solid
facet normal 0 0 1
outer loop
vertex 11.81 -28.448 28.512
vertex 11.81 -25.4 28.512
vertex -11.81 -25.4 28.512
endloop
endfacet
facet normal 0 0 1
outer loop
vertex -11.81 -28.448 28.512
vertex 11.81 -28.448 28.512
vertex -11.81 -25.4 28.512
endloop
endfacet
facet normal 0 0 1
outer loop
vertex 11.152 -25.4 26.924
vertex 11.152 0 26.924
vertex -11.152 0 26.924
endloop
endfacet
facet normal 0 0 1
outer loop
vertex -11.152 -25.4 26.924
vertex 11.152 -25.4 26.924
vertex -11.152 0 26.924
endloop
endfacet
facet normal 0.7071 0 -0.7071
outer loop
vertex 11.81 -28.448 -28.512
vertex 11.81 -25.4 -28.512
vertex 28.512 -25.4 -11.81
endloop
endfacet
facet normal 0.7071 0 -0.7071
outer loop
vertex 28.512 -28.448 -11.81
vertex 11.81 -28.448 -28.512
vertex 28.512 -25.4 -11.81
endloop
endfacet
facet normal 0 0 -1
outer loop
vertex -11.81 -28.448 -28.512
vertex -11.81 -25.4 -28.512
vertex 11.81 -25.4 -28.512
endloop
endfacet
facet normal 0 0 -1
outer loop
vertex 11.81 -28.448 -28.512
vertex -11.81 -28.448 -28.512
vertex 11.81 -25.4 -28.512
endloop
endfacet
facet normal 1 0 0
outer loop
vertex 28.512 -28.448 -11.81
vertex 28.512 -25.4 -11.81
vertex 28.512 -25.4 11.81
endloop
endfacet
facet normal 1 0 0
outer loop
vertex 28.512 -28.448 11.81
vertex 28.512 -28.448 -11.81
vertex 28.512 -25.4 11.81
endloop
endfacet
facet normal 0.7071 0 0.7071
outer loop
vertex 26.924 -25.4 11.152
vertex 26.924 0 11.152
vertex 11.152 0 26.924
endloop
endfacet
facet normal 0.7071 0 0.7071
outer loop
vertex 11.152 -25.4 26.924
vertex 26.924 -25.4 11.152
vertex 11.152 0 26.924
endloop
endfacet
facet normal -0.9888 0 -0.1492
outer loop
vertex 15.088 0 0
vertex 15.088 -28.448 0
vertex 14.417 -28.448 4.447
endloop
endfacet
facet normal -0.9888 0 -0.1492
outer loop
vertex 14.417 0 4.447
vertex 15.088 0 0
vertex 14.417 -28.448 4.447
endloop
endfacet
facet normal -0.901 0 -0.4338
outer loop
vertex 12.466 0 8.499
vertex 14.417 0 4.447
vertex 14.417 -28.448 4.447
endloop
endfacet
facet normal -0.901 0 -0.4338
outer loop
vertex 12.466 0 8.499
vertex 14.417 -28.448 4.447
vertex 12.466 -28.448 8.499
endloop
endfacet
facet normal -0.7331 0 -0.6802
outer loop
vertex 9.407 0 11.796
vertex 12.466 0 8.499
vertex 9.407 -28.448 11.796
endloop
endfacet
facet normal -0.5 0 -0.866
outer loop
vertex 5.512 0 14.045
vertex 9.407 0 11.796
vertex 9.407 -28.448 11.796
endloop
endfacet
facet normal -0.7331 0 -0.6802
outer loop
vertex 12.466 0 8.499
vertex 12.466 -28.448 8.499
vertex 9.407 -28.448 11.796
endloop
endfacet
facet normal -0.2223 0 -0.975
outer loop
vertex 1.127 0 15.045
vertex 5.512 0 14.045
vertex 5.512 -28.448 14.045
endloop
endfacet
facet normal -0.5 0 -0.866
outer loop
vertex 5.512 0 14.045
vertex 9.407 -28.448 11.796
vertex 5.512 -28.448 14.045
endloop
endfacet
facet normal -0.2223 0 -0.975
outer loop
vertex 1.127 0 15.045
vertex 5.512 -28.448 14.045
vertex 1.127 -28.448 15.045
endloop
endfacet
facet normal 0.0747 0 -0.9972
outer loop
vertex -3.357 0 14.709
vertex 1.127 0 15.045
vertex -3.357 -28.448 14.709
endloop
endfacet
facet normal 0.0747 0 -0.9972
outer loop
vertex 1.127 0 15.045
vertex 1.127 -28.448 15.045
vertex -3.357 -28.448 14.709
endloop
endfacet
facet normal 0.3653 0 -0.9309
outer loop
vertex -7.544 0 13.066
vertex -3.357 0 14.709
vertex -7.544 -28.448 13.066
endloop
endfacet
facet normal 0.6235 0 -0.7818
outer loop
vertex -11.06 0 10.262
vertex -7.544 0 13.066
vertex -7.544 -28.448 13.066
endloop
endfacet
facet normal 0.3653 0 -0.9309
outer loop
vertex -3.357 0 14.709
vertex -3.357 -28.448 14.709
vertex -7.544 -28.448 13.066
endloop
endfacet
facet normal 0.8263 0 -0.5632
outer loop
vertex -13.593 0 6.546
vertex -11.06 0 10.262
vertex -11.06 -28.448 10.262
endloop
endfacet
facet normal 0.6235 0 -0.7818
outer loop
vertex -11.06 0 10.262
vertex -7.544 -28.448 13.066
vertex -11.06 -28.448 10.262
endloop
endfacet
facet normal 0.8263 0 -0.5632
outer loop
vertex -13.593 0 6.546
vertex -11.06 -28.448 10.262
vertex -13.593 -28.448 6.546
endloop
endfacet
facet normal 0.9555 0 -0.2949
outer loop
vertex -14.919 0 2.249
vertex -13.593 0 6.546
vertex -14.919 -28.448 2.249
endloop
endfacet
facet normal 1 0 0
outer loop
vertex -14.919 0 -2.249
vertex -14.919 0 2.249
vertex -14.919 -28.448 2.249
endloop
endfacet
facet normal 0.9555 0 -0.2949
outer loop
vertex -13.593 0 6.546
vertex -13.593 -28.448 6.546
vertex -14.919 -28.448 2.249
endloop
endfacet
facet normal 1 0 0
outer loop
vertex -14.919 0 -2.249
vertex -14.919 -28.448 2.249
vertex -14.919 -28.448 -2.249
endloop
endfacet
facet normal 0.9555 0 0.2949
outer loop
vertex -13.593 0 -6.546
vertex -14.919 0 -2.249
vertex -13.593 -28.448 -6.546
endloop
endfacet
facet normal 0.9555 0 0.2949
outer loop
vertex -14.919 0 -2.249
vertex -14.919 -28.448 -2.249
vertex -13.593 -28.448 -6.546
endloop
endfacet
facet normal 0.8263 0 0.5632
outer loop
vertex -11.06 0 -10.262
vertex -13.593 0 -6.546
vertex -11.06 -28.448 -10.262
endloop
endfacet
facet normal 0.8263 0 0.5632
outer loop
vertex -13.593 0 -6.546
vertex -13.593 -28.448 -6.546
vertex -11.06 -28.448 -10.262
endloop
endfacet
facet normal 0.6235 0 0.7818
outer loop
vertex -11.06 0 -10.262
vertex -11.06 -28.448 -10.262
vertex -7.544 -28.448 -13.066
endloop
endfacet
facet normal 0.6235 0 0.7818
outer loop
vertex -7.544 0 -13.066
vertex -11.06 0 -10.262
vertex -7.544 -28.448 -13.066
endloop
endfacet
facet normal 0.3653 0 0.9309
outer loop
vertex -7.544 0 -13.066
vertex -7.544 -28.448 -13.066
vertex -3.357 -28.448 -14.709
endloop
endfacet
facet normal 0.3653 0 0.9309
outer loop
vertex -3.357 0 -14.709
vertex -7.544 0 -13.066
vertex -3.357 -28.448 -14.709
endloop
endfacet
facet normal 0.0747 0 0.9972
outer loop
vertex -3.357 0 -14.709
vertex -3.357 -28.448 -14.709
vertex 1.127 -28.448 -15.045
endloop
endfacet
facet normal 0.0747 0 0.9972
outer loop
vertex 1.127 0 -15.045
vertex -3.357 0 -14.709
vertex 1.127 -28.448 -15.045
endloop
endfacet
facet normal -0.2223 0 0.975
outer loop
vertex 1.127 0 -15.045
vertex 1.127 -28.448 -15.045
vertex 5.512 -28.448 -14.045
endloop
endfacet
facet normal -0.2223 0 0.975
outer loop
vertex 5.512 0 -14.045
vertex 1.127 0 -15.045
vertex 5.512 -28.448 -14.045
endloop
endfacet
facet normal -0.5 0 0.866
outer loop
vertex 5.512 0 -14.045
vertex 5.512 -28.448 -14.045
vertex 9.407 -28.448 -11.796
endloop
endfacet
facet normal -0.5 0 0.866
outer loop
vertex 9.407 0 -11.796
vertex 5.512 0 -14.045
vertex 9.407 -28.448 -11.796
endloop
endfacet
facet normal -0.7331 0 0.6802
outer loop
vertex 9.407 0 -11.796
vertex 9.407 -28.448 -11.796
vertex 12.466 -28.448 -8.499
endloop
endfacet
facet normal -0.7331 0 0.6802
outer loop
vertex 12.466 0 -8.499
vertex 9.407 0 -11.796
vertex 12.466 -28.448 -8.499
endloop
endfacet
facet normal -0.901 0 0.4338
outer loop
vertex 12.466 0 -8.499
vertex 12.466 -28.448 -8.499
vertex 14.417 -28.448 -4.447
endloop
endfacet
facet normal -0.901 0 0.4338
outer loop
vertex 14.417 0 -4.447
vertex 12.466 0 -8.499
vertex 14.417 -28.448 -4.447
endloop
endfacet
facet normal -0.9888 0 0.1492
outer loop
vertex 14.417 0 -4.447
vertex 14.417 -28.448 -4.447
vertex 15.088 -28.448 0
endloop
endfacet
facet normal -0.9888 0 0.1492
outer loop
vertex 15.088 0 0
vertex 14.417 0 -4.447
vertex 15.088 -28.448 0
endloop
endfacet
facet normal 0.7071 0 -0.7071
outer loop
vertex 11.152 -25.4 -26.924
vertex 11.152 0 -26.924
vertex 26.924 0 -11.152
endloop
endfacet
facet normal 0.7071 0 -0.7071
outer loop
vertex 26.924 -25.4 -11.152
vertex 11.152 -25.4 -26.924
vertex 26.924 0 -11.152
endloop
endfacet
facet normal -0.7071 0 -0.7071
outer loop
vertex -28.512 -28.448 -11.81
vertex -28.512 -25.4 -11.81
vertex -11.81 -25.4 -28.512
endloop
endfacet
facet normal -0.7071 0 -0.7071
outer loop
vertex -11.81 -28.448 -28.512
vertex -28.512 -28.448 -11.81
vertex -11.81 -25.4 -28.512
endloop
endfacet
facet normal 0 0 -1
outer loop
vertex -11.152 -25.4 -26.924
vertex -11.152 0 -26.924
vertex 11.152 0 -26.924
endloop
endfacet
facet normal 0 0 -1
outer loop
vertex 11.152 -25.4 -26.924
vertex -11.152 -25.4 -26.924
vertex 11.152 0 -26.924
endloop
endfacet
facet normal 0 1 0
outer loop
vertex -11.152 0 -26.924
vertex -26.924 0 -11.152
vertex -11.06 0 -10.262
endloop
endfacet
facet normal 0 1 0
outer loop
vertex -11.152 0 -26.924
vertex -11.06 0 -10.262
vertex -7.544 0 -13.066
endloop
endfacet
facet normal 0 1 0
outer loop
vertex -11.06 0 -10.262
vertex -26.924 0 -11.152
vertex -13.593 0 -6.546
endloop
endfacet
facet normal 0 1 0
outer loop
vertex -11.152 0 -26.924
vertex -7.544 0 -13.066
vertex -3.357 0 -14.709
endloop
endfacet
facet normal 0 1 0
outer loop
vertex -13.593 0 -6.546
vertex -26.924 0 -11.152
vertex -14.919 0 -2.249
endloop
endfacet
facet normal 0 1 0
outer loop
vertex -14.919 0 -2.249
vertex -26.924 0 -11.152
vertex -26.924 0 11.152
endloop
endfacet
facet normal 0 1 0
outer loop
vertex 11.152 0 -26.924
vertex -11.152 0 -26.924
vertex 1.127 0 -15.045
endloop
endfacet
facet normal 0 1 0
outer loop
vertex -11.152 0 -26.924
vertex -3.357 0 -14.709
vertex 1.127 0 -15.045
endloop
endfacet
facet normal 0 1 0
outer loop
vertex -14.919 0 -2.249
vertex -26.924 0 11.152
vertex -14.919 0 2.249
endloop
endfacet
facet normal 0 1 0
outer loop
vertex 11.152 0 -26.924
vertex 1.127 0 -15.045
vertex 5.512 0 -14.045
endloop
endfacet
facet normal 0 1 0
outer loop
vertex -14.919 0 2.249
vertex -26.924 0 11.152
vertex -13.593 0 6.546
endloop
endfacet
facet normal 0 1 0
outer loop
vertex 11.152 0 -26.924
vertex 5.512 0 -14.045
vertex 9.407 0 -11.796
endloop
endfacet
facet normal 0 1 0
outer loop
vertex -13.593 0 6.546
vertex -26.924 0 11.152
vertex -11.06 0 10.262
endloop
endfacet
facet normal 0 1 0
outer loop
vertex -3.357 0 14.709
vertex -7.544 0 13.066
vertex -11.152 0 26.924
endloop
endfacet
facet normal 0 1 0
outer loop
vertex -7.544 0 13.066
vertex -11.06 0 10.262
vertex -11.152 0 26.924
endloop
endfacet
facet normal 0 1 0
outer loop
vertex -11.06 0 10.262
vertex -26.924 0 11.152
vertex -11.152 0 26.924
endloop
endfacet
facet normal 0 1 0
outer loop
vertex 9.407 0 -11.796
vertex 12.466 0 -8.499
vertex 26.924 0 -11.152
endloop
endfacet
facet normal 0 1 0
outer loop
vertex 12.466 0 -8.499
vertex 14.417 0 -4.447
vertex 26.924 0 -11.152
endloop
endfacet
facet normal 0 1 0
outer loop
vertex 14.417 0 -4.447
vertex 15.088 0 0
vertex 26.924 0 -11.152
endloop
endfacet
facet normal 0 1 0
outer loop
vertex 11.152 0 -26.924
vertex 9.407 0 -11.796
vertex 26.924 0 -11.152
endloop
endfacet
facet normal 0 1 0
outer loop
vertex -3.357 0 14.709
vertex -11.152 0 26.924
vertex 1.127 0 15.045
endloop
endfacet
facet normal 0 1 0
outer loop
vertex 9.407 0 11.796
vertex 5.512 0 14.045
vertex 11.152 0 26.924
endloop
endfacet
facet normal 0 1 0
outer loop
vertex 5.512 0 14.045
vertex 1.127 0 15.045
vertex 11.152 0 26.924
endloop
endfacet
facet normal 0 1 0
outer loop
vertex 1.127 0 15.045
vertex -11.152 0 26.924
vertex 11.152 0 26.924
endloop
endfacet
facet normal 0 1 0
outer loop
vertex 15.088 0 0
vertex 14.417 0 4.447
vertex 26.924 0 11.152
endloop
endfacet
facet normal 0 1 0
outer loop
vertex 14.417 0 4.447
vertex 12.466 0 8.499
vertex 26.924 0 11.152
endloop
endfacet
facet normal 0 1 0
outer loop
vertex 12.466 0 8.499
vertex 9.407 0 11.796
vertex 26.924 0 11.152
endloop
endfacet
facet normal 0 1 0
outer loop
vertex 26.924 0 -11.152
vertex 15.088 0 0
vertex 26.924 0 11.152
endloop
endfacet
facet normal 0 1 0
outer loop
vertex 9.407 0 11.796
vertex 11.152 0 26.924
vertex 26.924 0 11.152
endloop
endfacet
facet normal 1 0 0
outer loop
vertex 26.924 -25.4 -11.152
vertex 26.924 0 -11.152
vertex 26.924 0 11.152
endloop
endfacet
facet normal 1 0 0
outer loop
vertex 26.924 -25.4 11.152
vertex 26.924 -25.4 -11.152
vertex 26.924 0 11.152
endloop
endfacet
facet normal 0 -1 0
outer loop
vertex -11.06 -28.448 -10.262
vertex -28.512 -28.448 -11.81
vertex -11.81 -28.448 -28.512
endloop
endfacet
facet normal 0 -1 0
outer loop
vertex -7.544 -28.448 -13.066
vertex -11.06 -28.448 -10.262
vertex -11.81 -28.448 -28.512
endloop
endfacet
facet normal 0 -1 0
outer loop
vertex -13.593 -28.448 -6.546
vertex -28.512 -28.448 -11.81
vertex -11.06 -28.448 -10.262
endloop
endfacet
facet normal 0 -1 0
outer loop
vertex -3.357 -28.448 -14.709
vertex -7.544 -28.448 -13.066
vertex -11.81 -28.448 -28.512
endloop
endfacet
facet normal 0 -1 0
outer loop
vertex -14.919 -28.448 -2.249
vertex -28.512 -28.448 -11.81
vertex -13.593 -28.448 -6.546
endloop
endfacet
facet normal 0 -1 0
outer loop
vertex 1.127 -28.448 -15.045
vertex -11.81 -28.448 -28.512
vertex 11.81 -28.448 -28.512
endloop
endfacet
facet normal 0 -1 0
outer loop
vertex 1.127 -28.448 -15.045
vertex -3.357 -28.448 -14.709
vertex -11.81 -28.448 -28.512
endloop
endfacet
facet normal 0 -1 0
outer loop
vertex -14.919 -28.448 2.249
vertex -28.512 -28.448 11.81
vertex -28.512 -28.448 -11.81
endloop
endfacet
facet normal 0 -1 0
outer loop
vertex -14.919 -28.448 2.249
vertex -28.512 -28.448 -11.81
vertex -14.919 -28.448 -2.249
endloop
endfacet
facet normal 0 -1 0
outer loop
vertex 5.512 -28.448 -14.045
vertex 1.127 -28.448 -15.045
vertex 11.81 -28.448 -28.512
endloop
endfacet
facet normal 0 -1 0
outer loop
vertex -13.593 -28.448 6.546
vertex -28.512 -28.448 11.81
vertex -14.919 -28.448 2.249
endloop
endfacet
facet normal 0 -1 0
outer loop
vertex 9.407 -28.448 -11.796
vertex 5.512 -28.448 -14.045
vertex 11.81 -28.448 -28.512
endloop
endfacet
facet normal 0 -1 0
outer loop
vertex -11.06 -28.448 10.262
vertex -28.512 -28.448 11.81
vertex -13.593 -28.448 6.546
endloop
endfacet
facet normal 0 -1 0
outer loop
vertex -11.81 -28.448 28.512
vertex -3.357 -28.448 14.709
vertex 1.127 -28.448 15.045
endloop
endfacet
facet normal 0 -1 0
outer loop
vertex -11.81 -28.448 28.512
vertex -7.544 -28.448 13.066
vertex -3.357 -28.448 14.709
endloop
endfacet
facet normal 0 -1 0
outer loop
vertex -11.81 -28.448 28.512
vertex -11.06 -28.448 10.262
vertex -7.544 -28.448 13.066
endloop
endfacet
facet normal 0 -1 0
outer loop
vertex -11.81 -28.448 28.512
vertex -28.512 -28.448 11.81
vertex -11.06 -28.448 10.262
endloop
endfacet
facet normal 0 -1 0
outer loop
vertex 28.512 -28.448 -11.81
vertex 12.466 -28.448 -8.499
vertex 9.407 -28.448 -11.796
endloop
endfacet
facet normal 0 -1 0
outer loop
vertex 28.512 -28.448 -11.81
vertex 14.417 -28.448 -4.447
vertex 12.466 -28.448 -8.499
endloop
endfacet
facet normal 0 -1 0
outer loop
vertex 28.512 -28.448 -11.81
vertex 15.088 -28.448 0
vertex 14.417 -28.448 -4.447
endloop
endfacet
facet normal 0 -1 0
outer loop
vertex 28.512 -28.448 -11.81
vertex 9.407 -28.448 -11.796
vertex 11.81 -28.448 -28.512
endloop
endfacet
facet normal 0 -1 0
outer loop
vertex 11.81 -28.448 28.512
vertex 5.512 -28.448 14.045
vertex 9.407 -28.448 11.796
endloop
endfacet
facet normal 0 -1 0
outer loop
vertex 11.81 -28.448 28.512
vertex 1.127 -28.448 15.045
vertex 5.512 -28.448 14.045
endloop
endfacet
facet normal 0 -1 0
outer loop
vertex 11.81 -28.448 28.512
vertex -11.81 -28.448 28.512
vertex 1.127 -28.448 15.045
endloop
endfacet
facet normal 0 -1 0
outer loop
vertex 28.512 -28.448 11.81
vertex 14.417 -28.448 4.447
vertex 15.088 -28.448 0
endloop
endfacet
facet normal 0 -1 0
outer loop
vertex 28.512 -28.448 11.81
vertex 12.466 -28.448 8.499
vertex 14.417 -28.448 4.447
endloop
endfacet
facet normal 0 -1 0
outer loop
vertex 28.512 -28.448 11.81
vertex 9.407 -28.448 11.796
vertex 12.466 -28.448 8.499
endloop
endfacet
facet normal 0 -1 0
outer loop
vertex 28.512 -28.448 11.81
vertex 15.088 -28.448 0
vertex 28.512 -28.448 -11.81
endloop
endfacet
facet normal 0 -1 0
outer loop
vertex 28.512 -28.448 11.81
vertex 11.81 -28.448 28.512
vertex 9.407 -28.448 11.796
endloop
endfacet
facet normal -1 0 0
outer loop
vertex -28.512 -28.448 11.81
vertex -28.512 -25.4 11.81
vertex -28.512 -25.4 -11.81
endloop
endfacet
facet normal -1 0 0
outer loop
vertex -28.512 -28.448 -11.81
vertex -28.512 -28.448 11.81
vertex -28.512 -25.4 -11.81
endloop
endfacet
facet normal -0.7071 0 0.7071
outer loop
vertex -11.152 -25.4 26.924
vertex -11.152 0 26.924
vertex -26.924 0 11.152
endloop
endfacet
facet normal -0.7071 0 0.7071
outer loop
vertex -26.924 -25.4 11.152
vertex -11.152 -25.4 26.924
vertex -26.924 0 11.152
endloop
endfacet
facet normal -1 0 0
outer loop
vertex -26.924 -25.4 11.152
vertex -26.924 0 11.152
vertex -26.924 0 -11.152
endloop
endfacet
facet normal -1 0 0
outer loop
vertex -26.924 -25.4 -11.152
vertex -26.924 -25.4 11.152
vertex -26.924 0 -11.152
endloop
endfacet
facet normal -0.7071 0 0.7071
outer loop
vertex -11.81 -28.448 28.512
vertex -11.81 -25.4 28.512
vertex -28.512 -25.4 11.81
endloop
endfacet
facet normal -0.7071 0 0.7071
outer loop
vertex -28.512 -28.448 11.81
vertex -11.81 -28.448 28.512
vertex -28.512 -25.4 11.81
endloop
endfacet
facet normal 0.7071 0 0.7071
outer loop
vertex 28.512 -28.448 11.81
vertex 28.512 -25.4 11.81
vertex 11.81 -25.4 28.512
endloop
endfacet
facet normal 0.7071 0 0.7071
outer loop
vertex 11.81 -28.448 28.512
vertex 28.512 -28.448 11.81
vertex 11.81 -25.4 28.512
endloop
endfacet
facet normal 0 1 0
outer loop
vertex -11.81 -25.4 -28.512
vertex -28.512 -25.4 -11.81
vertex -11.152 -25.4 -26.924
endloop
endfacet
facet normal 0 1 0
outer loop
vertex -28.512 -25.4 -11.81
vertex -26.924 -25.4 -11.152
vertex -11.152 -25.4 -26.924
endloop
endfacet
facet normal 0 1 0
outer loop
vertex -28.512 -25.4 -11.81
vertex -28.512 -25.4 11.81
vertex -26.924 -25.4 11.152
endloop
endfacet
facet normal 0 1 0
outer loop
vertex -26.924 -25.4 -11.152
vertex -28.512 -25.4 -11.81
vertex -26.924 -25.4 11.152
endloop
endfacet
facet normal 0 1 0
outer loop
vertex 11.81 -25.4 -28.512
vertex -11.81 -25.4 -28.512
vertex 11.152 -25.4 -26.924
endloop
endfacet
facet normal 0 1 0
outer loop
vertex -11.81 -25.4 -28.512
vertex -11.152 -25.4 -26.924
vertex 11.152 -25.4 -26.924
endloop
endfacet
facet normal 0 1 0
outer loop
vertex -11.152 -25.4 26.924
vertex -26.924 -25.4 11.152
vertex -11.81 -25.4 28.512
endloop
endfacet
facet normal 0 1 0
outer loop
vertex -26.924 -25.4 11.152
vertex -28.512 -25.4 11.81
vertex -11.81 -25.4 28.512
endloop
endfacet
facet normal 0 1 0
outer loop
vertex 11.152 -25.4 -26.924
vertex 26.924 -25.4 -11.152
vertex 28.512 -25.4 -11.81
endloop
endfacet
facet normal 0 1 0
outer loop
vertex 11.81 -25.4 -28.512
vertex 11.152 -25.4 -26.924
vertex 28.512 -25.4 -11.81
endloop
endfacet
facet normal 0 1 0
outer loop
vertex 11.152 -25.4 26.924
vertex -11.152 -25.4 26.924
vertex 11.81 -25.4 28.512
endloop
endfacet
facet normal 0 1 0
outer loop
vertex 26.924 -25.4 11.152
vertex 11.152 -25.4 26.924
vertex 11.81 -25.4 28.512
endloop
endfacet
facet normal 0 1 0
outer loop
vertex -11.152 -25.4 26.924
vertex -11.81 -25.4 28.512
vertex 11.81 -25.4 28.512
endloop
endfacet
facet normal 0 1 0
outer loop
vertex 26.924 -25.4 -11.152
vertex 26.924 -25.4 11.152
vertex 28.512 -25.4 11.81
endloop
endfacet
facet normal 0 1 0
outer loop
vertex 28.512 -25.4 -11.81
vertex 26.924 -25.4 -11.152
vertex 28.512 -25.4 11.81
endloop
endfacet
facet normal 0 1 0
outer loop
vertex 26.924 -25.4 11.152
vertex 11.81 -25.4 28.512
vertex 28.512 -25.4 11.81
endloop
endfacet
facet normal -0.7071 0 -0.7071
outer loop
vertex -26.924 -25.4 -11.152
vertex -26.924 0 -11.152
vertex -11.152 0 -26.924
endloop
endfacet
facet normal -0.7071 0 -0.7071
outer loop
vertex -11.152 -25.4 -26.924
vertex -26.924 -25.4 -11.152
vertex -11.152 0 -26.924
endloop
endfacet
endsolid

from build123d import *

# Parameters (mm, degrees)
F1_DEPTH = 25.4
F3_DEPTH = 3.048
F4_R     = 15.0876
F5_DEPTH = 28.449


with BuildPart() as f1:
    # F0 (on Front) → F1 (new body)
    with BuildSketch(Plane.XZ):
        Polygon((11.152286, 26.924), (-11.152286, 26.924), (-26.924, 11.152286), (-26.924, -11.152286), (-11.152286, -26.924), (11.152286, -26.924), (26.924, -11.152286), (26.924, 11.152286), align=None)
    extrude(amount=F1_DEPTH)

    # F2 (on face) → F3 (join)
    with BuildSketch(Plane.XZ.offset(25.4)):
        Polygon((11.80985, 28.5115), (-11.80985, 28.5115), (-28.5115, 11.80985), (-28.5115, -11.80985), (-11.80985, -28.5115), (11.80985, -28.5115), (28.5115, -11.80985), (28.5115, 11.80985), align=None)
    extrude(amount=F3_DEPTH)

    # F4 (on face) → F5 (cut, through all)
    with BuildSketch(Plane.XZ.offset(28.448)):
        Circle(F4_R)
    extrude(amount=-F5_DEPTH, mode=Mode.SUBTRACT)


solid = f1.part
